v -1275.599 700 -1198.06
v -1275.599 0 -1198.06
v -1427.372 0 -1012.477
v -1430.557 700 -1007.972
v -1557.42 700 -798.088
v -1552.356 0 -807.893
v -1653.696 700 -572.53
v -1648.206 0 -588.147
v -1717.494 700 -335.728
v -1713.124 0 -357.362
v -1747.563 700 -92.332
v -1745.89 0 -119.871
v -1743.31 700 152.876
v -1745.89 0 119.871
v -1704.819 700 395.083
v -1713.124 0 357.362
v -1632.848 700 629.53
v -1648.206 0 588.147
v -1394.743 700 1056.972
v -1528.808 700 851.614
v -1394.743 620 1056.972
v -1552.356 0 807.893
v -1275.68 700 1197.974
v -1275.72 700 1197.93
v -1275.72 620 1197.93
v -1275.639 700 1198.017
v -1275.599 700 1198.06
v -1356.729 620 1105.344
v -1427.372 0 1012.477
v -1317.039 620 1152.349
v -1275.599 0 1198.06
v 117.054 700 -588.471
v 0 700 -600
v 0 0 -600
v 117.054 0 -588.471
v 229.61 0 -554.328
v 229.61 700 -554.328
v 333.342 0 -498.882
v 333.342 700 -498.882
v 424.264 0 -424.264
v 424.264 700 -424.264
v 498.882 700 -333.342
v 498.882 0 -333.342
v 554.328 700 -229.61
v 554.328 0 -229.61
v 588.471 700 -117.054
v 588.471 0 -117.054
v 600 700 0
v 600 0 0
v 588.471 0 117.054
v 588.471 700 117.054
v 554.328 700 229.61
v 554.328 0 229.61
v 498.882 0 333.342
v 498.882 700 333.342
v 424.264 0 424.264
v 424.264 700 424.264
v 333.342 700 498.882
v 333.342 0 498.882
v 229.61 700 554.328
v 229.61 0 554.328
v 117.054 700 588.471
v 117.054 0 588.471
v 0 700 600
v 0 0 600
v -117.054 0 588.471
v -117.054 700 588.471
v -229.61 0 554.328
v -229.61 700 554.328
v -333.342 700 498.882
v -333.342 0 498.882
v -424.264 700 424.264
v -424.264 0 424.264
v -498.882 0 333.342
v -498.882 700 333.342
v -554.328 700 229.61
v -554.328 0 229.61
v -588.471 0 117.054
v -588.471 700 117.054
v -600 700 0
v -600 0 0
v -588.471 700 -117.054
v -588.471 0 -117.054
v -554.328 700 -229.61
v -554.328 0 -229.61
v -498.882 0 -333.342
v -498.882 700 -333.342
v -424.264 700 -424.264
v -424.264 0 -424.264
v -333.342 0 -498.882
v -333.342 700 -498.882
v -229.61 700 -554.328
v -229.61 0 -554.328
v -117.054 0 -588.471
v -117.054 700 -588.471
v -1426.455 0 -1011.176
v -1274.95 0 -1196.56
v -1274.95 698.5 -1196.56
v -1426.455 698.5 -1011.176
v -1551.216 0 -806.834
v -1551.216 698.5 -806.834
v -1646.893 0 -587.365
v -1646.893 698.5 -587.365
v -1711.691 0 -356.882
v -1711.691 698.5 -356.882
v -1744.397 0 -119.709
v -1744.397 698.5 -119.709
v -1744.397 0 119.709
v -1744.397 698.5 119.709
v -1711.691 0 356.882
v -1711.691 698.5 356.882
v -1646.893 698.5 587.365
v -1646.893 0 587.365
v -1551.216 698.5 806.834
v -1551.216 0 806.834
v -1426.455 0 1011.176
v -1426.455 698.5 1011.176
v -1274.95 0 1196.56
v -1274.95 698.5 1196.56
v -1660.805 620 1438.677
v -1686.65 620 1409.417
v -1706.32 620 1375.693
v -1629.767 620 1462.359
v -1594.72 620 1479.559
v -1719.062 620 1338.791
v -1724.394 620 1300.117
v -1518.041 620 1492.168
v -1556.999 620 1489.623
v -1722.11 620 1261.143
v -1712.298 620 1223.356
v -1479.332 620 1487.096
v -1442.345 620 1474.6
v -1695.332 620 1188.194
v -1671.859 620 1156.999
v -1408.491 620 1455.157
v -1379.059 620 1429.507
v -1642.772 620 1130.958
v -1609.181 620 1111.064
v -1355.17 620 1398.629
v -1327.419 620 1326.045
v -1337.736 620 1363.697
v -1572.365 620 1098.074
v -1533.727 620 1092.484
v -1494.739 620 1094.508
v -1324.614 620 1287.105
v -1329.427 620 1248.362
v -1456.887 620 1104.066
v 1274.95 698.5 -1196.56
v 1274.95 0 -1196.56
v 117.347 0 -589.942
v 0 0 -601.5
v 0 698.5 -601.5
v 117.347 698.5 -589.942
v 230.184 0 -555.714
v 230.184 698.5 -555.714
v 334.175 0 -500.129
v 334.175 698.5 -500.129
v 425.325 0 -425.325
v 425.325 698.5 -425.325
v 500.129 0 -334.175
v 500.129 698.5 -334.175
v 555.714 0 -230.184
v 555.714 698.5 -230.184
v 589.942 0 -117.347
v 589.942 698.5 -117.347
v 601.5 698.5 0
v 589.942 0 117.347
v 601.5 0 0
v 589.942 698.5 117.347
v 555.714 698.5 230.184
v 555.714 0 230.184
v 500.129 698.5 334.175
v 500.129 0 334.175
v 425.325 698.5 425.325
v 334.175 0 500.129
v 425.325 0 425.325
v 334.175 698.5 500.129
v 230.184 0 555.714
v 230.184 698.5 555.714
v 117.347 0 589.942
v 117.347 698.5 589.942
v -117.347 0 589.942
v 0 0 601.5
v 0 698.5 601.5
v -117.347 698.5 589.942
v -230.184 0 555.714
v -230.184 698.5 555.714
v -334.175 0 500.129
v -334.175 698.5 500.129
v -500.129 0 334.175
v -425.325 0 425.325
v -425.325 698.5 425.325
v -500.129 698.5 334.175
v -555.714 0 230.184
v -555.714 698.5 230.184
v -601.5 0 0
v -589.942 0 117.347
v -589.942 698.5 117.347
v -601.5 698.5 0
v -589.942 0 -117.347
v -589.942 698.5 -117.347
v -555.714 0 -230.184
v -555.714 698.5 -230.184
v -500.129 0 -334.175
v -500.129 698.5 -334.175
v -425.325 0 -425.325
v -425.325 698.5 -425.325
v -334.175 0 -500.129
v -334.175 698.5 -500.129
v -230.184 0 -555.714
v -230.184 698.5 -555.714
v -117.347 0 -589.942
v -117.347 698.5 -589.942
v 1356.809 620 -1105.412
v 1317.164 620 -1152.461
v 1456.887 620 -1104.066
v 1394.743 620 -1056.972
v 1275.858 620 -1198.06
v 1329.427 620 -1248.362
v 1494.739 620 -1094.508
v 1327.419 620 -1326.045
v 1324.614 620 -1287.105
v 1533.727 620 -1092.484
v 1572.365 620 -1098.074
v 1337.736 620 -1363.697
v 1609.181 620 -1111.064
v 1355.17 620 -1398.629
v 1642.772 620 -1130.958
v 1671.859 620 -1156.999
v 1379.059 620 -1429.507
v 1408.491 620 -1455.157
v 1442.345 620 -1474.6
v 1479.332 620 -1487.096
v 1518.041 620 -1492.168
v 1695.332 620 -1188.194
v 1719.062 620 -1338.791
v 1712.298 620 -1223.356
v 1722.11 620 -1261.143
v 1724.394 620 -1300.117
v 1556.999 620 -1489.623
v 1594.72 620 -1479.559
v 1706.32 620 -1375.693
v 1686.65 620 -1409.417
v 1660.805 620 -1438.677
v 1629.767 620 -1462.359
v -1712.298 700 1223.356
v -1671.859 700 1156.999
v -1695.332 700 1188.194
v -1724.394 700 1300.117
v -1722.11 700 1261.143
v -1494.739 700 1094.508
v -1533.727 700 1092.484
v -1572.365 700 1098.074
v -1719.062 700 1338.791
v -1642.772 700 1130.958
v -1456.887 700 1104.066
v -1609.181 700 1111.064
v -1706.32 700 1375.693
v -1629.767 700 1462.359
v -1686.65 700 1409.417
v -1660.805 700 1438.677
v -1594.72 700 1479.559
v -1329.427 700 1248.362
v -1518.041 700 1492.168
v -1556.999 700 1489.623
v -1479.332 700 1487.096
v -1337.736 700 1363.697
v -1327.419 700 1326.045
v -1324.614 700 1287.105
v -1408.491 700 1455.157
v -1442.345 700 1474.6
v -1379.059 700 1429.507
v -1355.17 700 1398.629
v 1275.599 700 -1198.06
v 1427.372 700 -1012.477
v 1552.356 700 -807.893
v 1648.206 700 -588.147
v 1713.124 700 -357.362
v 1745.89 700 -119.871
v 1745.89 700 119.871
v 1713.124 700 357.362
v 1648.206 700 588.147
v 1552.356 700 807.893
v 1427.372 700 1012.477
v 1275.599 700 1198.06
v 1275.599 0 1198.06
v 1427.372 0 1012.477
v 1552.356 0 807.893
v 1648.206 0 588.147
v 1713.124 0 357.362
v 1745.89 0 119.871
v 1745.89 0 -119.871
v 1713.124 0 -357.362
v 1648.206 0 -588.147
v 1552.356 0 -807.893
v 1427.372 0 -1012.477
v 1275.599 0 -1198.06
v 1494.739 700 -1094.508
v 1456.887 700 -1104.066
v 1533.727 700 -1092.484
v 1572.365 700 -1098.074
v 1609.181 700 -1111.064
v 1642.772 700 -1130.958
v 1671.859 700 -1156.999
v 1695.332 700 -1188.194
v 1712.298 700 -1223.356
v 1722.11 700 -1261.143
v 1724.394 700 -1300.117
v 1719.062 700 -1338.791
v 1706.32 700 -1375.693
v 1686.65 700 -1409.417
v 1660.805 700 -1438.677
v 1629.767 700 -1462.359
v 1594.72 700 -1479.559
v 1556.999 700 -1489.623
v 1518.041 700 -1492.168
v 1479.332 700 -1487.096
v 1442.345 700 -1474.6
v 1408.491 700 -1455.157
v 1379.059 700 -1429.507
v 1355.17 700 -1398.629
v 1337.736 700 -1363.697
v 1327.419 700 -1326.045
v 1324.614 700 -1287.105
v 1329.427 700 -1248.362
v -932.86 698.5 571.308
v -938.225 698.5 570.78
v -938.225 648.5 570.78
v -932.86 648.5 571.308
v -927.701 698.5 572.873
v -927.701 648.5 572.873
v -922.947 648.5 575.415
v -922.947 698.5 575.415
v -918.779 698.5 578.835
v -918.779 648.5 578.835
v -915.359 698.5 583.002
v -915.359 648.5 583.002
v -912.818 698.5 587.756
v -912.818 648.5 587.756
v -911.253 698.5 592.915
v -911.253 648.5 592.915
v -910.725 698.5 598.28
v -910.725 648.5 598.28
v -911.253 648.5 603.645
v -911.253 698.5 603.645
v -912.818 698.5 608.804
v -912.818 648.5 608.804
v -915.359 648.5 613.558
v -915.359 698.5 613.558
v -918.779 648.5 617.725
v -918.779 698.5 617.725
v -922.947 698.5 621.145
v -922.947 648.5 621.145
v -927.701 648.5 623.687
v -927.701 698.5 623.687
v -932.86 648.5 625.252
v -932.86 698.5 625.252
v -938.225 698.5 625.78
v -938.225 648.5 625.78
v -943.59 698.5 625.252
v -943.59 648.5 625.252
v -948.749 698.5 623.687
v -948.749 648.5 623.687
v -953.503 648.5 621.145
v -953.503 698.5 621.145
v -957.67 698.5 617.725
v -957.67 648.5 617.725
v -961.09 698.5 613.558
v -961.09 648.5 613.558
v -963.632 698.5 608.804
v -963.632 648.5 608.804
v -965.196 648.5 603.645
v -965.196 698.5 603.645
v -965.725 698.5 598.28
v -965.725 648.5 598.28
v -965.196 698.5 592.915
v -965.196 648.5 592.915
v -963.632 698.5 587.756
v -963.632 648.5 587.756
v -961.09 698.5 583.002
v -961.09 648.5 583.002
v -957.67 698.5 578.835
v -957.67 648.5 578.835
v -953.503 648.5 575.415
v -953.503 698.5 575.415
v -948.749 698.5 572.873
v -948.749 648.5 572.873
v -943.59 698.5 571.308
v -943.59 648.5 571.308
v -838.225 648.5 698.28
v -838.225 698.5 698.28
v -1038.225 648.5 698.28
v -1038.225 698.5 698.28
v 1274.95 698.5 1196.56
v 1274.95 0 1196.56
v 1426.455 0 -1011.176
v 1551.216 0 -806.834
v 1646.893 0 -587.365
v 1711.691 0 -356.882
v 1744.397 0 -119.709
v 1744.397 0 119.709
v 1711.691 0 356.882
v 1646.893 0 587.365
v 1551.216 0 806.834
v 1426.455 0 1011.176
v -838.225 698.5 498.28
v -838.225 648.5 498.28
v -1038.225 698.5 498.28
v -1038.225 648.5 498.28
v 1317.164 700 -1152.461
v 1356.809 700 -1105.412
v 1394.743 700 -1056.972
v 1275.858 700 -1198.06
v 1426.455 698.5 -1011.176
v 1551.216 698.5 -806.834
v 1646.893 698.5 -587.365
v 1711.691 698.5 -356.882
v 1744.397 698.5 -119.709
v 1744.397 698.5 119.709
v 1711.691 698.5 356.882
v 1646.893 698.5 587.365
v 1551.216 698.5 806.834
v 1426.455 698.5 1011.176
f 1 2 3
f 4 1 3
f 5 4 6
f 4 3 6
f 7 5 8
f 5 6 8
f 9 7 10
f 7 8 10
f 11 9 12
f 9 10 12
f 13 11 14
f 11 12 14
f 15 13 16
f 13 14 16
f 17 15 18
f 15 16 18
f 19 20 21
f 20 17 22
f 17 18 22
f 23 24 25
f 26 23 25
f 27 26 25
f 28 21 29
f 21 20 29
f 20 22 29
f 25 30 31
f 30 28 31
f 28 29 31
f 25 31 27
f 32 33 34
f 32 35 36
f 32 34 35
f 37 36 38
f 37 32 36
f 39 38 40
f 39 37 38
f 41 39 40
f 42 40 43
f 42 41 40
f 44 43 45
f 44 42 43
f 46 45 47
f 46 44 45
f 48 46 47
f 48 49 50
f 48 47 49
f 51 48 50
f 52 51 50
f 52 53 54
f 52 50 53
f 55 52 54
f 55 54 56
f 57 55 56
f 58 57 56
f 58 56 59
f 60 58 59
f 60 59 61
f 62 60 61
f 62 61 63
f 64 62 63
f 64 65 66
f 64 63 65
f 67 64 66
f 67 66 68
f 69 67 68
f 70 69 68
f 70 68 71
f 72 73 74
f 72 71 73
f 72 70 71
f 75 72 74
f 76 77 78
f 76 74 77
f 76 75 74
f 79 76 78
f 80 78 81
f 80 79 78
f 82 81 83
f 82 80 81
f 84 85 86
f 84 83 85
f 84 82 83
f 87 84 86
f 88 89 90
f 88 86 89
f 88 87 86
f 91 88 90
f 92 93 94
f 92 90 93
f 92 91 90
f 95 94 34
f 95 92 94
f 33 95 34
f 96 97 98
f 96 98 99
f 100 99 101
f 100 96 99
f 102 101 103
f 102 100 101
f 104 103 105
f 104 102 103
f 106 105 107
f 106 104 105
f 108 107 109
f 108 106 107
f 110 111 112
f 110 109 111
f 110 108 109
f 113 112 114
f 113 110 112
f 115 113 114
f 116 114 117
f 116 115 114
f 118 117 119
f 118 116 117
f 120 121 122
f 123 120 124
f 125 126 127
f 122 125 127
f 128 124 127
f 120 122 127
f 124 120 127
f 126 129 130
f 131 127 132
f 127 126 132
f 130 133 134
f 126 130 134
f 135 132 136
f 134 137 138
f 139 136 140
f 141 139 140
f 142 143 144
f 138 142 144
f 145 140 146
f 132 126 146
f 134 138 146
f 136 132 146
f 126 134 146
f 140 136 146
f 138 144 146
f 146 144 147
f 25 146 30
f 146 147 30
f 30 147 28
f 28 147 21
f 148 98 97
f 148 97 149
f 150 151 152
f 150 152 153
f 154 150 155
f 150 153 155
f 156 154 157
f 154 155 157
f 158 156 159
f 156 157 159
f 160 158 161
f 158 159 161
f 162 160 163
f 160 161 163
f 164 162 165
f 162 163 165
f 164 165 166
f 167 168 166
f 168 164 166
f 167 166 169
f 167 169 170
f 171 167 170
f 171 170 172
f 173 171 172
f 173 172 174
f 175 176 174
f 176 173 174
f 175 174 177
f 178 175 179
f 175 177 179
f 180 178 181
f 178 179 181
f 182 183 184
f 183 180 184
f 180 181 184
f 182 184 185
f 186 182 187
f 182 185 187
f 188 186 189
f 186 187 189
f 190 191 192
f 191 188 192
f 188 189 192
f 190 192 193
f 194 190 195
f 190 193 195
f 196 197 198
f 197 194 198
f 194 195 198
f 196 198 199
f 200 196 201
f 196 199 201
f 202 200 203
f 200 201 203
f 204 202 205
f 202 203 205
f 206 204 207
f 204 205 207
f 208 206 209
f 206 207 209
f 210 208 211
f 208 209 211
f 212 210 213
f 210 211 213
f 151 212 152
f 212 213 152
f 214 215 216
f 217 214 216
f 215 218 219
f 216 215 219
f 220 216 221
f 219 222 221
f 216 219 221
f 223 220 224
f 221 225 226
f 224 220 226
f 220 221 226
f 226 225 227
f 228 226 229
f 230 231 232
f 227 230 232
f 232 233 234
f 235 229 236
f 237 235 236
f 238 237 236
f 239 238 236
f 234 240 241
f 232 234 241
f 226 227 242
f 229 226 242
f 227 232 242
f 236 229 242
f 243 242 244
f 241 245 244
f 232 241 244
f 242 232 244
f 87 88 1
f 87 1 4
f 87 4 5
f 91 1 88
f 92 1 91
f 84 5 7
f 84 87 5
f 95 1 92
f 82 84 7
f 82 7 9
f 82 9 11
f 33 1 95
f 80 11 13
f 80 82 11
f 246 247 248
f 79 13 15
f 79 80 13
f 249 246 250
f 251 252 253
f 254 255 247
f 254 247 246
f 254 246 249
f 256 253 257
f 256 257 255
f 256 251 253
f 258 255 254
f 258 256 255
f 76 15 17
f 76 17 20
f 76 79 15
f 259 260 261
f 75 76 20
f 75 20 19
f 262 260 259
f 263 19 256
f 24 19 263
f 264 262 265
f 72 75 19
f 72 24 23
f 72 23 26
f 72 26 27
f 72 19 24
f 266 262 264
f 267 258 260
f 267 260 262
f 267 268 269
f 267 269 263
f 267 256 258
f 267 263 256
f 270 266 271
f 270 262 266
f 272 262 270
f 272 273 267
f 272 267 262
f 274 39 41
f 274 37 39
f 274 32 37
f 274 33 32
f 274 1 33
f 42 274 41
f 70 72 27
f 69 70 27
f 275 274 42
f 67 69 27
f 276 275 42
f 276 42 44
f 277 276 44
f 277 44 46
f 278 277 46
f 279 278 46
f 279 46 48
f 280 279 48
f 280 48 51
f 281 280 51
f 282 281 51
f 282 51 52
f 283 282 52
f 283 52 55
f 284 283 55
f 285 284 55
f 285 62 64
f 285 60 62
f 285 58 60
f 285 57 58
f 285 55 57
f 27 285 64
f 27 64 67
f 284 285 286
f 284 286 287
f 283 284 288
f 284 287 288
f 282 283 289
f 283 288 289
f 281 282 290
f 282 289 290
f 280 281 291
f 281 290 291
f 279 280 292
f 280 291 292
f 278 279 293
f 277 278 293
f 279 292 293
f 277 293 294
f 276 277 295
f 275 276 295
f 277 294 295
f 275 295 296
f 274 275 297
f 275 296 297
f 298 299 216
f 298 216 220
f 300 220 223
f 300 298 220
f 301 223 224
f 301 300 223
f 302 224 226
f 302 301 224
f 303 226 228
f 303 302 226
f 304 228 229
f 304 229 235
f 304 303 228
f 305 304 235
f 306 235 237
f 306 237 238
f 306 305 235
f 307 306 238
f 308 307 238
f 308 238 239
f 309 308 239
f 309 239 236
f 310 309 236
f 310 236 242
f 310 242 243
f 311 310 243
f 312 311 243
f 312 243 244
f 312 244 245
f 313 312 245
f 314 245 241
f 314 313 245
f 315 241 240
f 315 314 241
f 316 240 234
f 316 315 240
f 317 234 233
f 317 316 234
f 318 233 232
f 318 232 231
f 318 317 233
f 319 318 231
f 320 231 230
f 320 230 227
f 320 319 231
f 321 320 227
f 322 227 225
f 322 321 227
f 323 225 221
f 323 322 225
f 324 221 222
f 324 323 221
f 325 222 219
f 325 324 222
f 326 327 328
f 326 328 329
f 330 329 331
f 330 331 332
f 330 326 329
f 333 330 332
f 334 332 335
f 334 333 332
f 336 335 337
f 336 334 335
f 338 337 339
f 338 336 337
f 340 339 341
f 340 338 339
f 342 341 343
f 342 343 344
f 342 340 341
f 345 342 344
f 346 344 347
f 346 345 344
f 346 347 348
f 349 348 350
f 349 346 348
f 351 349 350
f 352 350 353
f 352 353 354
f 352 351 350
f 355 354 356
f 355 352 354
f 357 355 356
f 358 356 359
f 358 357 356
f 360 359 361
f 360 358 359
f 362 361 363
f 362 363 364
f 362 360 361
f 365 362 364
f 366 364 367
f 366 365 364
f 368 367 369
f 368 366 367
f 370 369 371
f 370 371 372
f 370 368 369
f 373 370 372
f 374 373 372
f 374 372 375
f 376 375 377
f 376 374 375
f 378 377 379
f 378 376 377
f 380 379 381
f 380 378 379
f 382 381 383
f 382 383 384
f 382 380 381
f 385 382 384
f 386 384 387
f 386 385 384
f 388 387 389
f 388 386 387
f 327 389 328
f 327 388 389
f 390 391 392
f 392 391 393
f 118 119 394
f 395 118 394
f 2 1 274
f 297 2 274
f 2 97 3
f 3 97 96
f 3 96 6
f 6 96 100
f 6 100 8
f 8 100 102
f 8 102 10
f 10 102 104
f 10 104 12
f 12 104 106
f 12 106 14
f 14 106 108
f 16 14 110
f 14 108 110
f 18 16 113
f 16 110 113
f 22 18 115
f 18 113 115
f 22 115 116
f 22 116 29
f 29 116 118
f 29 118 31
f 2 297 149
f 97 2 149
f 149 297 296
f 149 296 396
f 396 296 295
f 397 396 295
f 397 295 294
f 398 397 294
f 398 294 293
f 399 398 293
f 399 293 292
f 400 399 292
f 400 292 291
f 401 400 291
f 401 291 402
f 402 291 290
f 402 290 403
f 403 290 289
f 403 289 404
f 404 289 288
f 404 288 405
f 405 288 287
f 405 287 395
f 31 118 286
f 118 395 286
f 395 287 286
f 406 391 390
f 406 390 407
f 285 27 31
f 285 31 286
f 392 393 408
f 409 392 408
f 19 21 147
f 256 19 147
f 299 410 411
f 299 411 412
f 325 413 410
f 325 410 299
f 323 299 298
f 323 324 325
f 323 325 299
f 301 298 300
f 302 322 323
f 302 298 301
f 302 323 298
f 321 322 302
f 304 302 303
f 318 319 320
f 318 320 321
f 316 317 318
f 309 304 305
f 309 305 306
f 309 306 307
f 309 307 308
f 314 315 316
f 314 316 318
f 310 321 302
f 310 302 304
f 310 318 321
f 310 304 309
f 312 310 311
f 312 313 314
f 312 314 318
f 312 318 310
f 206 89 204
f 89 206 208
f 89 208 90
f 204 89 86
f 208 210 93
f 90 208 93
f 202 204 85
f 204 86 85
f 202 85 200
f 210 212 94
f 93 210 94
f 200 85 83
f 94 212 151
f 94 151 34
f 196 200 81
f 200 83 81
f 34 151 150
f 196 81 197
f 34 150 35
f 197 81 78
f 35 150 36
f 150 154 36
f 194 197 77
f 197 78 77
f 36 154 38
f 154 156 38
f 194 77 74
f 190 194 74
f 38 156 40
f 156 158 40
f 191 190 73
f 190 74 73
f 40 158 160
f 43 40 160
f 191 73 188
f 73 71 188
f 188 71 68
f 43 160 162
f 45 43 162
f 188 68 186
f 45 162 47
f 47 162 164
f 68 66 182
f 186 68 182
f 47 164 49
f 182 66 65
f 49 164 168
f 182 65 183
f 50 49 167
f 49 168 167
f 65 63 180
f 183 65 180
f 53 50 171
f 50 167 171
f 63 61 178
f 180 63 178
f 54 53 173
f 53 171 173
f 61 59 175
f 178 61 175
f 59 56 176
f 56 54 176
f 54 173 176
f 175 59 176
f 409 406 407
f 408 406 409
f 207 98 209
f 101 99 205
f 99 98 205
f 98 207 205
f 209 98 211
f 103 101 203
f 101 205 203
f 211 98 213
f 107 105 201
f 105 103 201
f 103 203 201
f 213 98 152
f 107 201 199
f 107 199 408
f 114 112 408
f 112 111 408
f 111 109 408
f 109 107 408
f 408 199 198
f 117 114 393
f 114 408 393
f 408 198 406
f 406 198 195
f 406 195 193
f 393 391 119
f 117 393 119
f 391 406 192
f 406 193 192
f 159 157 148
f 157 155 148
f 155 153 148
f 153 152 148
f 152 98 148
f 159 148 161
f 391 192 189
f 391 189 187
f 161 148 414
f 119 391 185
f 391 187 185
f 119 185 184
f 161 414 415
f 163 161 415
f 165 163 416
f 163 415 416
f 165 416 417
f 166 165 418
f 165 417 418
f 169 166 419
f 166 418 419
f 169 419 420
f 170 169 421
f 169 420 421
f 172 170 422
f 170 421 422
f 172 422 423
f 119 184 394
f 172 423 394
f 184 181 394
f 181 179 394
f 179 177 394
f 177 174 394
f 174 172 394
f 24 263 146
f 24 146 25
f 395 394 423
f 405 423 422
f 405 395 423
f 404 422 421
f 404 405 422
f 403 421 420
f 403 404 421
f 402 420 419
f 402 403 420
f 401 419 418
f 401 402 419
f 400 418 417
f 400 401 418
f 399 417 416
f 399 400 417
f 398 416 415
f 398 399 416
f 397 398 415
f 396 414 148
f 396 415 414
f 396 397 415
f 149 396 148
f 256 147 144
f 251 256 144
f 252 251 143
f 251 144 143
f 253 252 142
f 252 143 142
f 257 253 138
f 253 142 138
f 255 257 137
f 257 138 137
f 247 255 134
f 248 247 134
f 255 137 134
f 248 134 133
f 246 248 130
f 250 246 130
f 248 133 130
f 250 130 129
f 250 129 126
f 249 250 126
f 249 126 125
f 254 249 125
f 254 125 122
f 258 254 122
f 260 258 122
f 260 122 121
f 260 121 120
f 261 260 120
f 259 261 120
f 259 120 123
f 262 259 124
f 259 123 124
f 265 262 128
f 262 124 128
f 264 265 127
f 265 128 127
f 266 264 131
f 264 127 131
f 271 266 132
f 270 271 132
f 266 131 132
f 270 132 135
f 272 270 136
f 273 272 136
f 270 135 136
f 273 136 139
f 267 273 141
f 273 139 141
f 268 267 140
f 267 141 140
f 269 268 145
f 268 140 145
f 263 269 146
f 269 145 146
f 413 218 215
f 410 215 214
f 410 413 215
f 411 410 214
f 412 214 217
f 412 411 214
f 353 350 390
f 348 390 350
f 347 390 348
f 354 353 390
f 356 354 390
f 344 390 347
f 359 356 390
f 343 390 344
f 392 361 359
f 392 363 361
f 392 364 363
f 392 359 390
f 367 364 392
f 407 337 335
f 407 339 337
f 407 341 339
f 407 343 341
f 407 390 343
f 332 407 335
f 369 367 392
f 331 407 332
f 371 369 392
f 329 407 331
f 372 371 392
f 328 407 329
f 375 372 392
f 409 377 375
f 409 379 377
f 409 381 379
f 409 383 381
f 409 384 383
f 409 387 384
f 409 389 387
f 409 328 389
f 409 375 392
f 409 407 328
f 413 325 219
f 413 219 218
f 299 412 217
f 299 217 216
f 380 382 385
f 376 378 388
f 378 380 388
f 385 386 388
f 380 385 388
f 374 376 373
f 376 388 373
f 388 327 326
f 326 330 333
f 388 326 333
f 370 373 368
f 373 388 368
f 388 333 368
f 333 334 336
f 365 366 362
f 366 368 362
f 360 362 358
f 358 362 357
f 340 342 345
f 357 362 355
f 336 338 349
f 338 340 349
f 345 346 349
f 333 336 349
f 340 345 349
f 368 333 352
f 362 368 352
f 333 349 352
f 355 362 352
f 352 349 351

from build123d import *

# Parameters (mm, degrees)
SKETCH1_R                = 1750
BOSS_EXTRUDE1_DEPTH      = 700
CUT_EXTRUDE10_DEPTH      = 2572.964229922
CUT_EXTRUDE10_DEPTH_BACK = 2572.964229922
SKETCH9_W                = 5273.235769222
SKETCH9_H                = 4165.824449254
SKETCH9_W_2              = 4212.623718326
SKETCH9_H_2              = 2396.11984
CUT_EXTRUDE3_DEPTH       = 2234.348958831
CUT_EXTRUDE3_DEPTH_BACK  = 2234.348958831
SKETCH3_R                = 600
SHELL1_T                 = -1.5
BOSS_EXTRUDE2_START      = -80
BOSS_EXTRUDE2_DEPTH      = 80
BOSS_EXTRUDE3_DEPTH      = 80
BOSS_EXTRUDE4_DEPTH      = 50


with BuildPart() as part:
    # Sketch1 → Boss-Extrude1 (new body)
    with BuildSketch(Plane(origin=(0, 0, 0), x_dir=(1, 0, 0), z_dir=(0, 1, 0))):
        Circle(SKETCH1_R)
    extrude(amount=BOSS_EXTRUDE1_DEPTH)

    # Sketch9 → Cut-Extrude10 (cut, two sides: drawn at the far end of the back side and taken through both)
    with BuildSketch(Plane.XZ.offset(-CUT_EXTRUDE10_DEPTH_BACK)):
        Rectangle(SKETCH9_W, SKETCH9_H)
        Rectangle(SKETCH9_W_2, SKETCH9_H_2, mode=Mode.SUBTRACT)
    extrude(amount=CUT_EXTRUDE10_DEPTH + CUT_EXTRUDE10_DEPTH_BACK, mode=Mode.SUBTRACT)

    # Sketch3 → Cut-Extrude3 (cut, two sides: drawn at the far end of the back side and taken through both)
    with BuildSketch(Plane.XZ.offset(-CUT_EXTRUDE3_DEPTH_BACK)):
        Circle(SKETCH3_R)
    extrude(amount=CUT_EXTRUDE3_DEPTH + CUT_EXTRUDE3_DEPTH_BACK, mode=Mode.SUBTRACT)

    # Shell1
    shell1_openings = [part.faces().sort_by_distance(p)[0] for p in [
        (1707.583740986, 0, 0),
    ]]
    offset(amount=SHELL1_T, openings=shell1_openings, kind=Kind.INTERSECTION)

    # Sketch12 → Boss-Extrude2 (add)
    with BuildSketch(Plane(origin=(0, 700, 0), x_dir=(1, 0, 0), z_dir=(0, 1, 0)).offset(BOSS_EXTRUDE2_START)):
        with BuildLine():
            Line((-1329.427366657, -1248.362496346), (-1275.720428066, -1197.93046101))
            ThreePointArc((-1275.720428066, -1197.93046101), (-1337.090701529, -1129.021016582), (-1394.743394808, -1056.972498526))
            Line((-1394.743394808, -1056.972498526), (-1456.886660309, -1104.066267063))
            ThreePointArc((-1456.886660309, -1104.066267063), (-1674.443216413, -1424.679230146), (-1329.427366657, -1248.362496346))
        make_face()
    extrude(amount=BOSS_EXTRUDE2_DEPTH)

    # Sketch13 → Boss-Extrude4 (add)
    with BuildSketch(Plane(origin=(0, 698.5, 0), x_dir=(-1, 0, 0), z_dir=(0, -1, 0))):
        Polygon((838.224823525, -698.27995814), (994.506973536, -698.27995814), (1038.224823525, -698.27995814), (1038.224823525, -498.27995814), (838.224823525, -498.27995814), align=None)
        with BuildLine():
            ThreePointArc((965.724823525, -598.27995814), (961.964779353, -612.16032187), (951.712860088, -622.244992455))
            ThreePointArc((951.712860088, -622.244992455), (914.484867696, -584.399594411), (965.724823525, -598.27995814))
        make_face(mode=Mode.SUBTRACT)
    extrude(amount=BOSS_EXTRUDE4_DEPTH)


with BuildPart() as body_2:
    # Sketch12<6> → Boss-Extrude3 (new body)
    with BuildSketch(Plane(origin=(0, 700, 0), x_dir=(1, 0, 0), z_dir=(0, 1, 0))):
        with BuildLine():
            Line((1329.427366657, 1248.362496346), (1275.858293729, 1198.05992))
            ThreePointArc((1275.858293729, 1198.05992), (1337.197472539, 1129.114373304), (1394.743394808, 1056.972498526))
            Line((1394.743394808, 1056.972498526), (1456.886660309, 1104.066267063))
            ThreePointArc((1456.886660309, 1104.066267063), (1674.443216413, 1424.679230146), (1329.427366657, 1248.362496346))
        make_face()
    extrude(amount=-BOSS_EXTRUDE3_DEPTH)


solid = Compound([part.part, body_2.part])
